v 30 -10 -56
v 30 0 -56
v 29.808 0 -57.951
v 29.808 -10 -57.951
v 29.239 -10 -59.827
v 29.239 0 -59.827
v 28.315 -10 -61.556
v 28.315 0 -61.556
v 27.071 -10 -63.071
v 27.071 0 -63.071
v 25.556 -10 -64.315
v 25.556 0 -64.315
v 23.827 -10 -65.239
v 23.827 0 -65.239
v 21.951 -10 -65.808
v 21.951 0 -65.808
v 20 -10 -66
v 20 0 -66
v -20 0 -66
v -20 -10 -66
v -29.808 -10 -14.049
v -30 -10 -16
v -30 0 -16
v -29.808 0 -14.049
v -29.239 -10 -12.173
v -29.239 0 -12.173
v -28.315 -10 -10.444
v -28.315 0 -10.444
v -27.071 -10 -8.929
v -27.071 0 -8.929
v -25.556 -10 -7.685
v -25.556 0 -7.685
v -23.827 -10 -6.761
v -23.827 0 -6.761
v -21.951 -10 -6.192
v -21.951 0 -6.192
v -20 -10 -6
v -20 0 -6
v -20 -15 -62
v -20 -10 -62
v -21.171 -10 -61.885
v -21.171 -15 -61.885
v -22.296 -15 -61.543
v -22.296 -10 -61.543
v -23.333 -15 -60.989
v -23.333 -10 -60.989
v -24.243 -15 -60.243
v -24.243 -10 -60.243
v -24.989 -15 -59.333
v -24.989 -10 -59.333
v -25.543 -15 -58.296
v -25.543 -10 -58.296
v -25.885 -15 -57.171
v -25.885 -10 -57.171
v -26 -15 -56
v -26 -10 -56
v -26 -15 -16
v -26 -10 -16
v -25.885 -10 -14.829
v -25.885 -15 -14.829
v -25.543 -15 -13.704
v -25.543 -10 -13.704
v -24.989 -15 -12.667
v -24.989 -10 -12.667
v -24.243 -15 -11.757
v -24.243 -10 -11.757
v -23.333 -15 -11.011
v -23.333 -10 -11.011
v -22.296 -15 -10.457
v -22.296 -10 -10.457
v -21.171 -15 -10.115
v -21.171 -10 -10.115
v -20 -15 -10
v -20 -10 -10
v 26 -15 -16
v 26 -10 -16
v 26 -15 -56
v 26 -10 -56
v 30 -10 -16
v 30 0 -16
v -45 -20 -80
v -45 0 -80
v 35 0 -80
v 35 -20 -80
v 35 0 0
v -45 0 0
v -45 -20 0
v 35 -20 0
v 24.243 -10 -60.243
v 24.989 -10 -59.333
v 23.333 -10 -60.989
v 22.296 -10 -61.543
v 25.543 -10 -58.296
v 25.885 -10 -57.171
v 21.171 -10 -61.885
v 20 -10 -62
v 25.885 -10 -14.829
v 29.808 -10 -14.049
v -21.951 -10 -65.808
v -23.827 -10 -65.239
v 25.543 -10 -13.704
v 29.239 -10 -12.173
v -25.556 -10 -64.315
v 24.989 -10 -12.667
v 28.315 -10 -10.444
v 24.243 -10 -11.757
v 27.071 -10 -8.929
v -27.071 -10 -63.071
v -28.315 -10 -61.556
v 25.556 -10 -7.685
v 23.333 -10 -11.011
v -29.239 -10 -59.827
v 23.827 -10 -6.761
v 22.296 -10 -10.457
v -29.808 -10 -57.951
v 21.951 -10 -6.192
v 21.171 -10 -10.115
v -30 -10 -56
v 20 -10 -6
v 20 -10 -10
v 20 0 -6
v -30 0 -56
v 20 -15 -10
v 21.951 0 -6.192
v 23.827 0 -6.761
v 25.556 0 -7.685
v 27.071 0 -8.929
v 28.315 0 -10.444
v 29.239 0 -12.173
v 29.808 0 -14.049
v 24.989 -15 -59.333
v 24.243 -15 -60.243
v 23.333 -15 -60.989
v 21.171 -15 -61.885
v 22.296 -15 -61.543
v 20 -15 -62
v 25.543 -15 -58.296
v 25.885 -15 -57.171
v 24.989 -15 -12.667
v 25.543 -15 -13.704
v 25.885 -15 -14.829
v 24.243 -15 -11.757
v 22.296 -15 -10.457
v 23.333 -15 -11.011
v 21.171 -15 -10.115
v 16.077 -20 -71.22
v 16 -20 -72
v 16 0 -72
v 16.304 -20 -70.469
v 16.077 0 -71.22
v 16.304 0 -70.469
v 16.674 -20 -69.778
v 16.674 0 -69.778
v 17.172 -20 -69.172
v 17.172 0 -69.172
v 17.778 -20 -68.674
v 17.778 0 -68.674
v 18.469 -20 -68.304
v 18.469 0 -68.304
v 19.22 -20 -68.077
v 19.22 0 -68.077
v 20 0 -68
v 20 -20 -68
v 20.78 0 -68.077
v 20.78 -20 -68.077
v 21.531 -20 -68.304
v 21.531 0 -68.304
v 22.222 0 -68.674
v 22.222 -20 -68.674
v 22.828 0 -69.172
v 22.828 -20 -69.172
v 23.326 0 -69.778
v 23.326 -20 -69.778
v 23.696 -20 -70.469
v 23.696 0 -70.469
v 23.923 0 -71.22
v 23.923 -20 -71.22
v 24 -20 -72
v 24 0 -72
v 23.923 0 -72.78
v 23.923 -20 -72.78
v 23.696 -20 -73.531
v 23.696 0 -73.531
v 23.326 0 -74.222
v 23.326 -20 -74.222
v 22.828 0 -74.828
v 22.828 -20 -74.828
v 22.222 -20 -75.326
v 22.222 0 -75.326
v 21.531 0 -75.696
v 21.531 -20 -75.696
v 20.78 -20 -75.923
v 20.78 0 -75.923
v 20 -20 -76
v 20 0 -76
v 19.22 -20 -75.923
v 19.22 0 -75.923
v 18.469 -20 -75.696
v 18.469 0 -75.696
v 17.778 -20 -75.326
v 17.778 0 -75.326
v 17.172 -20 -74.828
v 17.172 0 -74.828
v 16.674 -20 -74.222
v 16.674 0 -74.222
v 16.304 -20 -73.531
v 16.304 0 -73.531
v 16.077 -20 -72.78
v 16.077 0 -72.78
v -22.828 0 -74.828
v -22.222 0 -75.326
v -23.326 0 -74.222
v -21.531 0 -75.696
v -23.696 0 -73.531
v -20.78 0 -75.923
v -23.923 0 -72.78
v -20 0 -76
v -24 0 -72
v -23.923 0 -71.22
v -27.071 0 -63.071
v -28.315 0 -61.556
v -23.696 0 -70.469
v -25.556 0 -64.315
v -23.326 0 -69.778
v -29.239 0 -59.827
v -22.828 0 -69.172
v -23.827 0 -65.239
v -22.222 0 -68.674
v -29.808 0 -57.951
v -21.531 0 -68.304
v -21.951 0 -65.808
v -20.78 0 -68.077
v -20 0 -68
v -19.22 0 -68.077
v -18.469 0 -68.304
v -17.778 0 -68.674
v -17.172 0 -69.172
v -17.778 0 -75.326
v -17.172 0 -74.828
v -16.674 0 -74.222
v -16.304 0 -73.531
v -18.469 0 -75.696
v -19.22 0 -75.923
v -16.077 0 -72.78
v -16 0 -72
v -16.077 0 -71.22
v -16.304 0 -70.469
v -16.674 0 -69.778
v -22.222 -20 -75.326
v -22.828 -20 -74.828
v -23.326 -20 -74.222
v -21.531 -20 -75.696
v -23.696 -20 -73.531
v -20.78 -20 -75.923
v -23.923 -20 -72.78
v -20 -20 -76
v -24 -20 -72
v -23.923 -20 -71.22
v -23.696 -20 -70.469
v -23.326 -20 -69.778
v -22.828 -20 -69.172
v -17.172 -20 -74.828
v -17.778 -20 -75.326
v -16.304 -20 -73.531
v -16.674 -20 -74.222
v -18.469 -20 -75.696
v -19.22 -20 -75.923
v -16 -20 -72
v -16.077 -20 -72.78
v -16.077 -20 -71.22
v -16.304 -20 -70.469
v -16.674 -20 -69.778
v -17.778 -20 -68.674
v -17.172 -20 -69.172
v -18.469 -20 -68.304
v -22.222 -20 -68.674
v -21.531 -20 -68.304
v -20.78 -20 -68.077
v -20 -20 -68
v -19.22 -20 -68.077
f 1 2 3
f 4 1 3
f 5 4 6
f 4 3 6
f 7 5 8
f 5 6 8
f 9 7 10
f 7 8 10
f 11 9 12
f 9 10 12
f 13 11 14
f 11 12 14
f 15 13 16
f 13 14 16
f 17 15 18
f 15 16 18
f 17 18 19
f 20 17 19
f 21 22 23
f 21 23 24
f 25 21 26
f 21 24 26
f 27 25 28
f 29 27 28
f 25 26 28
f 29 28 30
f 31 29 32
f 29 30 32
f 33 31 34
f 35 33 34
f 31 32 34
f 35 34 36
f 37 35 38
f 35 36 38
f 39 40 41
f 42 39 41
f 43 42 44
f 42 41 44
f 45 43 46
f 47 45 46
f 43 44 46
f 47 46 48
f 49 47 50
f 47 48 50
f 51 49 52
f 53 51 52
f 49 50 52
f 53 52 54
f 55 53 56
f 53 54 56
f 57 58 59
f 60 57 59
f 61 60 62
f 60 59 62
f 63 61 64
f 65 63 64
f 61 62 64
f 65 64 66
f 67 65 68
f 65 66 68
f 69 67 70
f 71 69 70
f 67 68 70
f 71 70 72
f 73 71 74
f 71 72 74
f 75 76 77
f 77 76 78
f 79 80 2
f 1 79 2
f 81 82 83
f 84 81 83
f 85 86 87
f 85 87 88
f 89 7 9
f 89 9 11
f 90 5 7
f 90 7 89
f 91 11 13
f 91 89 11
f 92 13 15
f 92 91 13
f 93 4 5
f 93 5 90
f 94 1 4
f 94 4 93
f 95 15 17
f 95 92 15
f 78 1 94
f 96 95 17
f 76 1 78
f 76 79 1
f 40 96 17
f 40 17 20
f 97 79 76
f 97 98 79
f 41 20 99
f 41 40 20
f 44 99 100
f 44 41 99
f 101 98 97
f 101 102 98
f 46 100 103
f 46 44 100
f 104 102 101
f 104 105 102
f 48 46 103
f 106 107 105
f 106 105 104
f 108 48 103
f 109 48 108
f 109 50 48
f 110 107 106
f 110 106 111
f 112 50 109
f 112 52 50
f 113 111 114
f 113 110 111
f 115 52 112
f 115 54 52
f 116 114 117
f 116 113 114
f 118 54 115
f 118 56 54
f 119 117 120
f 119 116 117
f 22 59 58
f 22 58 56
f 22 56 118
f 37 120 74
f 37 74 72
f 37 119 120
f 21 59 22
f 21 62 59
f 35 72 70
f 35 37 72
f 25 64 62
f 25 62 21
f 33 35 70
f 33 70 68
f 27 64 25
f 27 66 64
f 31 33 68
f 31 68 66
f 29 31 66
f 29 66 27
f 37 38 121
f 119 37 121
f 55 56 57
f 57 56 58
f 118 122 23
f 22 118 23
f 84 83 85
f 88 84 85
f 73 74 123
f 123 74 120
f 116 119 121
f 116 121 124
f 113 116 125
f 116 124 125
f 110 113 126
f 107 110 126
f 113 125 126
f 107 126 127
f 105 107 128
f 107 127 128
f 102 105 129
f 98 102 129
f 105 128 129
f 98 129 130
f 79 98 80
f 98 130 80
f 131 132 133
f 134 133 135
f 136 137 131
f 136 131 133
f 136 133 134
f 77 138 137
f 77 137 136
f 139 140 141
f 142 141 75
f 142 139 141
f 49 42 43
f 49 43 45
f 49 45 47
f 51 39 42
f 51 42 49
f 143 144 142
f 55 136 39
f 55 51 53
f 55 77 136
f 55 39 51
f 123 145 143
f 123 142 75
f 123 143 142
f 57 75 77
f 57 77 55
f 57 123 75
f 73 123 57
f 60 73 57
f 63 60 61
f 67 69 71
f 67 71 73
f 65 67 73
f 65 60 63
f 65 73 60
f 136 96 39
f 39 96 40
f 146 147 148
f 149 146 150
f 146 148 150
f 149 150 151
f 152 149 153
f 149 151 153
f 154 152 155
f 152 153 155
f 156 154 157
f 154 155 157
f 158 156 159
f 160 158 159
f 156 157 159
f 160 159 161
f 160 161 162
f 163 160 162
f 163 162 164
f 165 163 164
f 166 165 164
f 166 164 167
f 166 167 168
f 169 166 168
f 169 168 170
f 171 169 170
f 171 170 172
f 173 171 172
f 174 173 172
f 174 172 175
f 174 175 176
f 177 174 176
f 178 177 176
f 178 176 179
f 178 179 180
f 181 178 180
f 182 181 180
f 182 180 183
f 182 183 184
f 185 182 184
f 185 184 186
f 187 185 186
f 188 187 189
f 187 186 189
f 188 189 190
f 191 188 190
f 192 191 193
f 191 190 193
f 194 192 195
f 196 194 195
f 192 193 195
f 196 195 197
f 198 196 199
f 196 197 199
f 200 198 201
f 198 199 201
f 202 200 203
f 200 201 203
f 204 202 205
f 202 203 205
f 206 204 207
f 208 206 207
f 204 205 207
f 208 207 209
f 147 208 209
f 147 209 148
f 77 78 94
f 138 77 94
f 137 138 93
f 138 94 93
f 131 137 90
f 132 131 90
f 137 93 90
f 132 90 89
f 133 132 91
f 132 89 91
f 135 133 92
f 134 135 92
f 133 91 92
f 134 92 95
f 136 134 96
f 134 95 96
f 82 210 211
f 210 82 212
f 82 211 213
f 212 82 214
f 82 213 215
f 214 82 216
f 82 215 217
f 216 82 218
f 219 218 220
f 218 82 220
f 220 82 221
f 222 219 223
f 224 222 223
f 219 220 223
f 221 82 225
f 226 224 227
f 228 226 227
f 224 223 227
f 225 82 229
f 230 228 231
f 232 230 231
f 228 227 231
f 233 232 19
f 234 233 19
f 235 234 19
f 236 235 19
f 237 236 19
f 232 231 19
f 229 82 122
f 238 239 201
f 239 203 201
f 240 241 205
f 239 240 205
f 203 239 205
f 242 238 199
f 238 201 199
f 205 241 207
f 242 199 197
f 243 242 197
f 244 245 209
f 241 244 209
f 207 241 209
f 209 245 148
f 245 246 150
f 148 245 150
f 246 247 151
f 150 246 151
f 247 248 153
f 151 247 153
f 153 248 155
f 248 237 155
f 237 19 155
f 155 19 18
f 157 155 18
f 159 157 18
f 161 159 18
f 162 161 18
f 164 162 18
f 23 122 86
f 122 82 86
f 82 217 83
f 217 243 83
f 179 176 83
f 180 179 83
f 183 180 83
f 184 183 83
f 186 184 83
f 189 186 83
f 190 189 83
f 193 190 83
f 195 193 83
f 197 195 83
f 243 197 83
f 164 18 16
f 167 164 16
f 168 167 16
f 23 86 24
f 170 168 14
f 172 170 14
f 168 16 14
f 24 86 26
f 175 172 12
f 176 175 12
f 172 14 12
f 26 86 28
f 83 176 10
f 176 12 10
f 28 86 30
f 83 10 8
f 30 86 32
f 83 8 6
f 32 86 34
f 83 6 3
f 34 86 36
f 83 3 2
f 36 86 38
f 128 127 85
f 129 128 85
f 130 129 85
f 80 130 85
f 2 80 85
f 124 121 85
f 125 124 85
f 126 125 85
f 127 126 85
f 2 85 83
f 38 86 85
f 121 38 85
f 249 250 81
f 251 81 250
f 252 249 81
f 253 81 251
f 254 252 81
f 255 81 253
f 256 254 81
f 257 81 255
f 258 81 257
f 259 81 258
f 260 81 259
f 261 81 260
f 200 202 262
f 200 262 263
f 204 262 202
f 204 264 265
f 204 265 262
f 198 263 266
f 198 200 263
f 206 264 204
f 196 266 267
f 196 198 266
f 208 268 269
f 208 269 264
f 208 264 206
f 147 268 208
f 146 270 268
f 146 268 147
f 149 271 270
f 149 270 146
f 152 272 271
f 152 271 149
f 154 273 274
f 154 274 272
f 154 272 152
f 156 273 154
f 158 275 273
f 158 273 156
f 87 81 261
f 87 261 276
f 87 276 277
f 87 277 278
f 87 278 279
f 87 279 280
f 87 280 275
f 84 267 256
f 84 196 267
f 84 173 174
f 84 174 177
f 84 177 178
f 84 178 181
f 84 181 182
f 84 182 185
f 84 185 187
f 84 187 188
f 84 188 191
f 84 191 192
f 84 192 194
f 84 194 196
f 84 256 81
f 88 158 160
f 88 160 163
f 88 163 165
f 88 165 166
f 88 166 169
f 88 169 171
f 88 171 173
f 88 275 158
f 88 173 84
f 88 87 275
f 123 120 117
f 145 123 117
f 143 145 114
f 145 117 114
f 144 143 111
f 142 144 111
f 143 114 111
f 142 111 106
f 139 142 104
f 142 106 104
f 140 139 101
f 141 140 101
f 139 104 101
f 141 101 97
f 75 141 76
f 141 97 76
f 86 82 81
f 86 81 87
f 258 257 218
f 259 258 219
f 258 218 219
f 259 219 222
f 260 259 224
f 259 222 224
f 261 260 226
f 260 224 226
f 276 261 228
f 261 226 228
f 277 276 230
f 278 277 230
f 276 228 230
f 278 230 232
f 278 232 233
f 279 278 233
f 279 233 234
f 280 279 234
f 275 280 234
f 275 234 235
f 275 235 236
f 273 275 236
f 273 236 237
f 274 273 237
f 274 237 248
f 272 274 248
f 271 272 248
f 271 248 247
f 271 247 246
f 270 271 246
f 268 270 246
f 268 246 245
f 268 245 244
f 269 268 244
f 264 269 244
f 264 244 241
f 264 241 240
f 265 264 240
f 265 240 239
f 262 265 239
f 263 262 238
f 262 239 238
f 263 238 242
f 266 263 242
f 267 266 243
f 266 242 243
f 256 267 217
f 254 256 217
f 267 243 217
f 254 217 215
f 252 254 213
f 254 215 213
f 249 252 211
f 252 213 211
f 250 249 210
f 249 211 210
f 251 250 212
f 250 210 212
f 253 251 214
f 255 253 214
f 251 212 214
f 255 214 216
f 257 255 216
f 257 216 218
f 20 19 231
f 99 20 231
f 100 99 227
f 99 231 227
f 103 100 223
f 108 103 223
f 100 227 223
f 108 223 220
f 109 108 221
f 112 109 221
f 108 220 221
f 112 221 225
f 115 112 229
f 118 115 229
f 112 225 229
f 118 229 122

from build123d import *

# Parameters (mm, degrees)
F0_W     = 80
F0_H     = 80
F1_DEPTH = 20
F3_DEPTH = 15
F5_DEPTH = 10
F6_R     = 4
F7_DEPTH = 20.001


with BuildPart() as f1:
    # F0 (on Front) → F1 (new body)
    with BuildSketch(Plane.XZ):
        with Locations((-5, -40)):
            Rectangle(F0_W, F0_H)
    extrude(amount=F1_DEPTH)

    # F2 (on face) → F3 (cut)
    with BuildSketch(Plane(origin=(0, 0, 0), x_dir=(-1, 0, 0), z_dir=(0, 1, 0))):
        with BuildLine():
            ThreePointArc((-26, -56), (-24.242641, -60.242641), (-20, -62))
            Line((-20, -62), (20, -62))
            ThreePointArc((20, -62), (24.242641, -60.242641), (26, -56))
            Line((26, -56), (26, -16))
            ThreePointArc((26, -16), (24.242641, -11.757359), (20, -10))
            Line((20, -10), (-20, -10))
            ThreePointArc((-20, -10), (-24.242641, -11.757359), (-26, -16))
            Line((-26, -16), (-26, -56))
        make_face()
    extrude(amount=-F3_DEPTH, mode=Mode.SUBTRACT)

    # F4 (on face) → F5 (cut)
    with BuildSketch(Plane(origin=(0, 0, 0), x_dir=(-1, 0, 0), z_dir=(0, 1, 0))):
        with BuildLine():
            ThreePointArc((-30, -56), (-27.071068, -63.071068), (-20, -66))
            Line((-20, -66), (20, -66))
            ThreePointArc((20, -66), (27.071068, -63.071068), (30, -56))
            Line((30, -56), (30, -16))
            ThreePointArc((30, -16), (27.071068, -8.928932), (20, -6))
            Line((20, -6), (-20, -6))
            ThreePointArc((-20, -6), (-27.071068, -8.928932), (-30, -16))
            Line((-30, -16), (-30, -56))
        make_face()
    extrude(amount=-F5_DEPTH, mode=Mode.SUBTRACT)

    # F6 (on face) → F7 (cut, through all)
    with BuildSketch(Plane(origin=(0, 0, 0), x_dir=(-1, 0, 0), z_dir=(0, 1, 0))):
        with Locations((-20, -72)):
            Circle(F6_R)
        with Locations((20, -72)):
            Circle(F6_R)
    extrude(amount=-F7_DEPTH, mode=Mode.SUBTRACT)


solid = f1.part
